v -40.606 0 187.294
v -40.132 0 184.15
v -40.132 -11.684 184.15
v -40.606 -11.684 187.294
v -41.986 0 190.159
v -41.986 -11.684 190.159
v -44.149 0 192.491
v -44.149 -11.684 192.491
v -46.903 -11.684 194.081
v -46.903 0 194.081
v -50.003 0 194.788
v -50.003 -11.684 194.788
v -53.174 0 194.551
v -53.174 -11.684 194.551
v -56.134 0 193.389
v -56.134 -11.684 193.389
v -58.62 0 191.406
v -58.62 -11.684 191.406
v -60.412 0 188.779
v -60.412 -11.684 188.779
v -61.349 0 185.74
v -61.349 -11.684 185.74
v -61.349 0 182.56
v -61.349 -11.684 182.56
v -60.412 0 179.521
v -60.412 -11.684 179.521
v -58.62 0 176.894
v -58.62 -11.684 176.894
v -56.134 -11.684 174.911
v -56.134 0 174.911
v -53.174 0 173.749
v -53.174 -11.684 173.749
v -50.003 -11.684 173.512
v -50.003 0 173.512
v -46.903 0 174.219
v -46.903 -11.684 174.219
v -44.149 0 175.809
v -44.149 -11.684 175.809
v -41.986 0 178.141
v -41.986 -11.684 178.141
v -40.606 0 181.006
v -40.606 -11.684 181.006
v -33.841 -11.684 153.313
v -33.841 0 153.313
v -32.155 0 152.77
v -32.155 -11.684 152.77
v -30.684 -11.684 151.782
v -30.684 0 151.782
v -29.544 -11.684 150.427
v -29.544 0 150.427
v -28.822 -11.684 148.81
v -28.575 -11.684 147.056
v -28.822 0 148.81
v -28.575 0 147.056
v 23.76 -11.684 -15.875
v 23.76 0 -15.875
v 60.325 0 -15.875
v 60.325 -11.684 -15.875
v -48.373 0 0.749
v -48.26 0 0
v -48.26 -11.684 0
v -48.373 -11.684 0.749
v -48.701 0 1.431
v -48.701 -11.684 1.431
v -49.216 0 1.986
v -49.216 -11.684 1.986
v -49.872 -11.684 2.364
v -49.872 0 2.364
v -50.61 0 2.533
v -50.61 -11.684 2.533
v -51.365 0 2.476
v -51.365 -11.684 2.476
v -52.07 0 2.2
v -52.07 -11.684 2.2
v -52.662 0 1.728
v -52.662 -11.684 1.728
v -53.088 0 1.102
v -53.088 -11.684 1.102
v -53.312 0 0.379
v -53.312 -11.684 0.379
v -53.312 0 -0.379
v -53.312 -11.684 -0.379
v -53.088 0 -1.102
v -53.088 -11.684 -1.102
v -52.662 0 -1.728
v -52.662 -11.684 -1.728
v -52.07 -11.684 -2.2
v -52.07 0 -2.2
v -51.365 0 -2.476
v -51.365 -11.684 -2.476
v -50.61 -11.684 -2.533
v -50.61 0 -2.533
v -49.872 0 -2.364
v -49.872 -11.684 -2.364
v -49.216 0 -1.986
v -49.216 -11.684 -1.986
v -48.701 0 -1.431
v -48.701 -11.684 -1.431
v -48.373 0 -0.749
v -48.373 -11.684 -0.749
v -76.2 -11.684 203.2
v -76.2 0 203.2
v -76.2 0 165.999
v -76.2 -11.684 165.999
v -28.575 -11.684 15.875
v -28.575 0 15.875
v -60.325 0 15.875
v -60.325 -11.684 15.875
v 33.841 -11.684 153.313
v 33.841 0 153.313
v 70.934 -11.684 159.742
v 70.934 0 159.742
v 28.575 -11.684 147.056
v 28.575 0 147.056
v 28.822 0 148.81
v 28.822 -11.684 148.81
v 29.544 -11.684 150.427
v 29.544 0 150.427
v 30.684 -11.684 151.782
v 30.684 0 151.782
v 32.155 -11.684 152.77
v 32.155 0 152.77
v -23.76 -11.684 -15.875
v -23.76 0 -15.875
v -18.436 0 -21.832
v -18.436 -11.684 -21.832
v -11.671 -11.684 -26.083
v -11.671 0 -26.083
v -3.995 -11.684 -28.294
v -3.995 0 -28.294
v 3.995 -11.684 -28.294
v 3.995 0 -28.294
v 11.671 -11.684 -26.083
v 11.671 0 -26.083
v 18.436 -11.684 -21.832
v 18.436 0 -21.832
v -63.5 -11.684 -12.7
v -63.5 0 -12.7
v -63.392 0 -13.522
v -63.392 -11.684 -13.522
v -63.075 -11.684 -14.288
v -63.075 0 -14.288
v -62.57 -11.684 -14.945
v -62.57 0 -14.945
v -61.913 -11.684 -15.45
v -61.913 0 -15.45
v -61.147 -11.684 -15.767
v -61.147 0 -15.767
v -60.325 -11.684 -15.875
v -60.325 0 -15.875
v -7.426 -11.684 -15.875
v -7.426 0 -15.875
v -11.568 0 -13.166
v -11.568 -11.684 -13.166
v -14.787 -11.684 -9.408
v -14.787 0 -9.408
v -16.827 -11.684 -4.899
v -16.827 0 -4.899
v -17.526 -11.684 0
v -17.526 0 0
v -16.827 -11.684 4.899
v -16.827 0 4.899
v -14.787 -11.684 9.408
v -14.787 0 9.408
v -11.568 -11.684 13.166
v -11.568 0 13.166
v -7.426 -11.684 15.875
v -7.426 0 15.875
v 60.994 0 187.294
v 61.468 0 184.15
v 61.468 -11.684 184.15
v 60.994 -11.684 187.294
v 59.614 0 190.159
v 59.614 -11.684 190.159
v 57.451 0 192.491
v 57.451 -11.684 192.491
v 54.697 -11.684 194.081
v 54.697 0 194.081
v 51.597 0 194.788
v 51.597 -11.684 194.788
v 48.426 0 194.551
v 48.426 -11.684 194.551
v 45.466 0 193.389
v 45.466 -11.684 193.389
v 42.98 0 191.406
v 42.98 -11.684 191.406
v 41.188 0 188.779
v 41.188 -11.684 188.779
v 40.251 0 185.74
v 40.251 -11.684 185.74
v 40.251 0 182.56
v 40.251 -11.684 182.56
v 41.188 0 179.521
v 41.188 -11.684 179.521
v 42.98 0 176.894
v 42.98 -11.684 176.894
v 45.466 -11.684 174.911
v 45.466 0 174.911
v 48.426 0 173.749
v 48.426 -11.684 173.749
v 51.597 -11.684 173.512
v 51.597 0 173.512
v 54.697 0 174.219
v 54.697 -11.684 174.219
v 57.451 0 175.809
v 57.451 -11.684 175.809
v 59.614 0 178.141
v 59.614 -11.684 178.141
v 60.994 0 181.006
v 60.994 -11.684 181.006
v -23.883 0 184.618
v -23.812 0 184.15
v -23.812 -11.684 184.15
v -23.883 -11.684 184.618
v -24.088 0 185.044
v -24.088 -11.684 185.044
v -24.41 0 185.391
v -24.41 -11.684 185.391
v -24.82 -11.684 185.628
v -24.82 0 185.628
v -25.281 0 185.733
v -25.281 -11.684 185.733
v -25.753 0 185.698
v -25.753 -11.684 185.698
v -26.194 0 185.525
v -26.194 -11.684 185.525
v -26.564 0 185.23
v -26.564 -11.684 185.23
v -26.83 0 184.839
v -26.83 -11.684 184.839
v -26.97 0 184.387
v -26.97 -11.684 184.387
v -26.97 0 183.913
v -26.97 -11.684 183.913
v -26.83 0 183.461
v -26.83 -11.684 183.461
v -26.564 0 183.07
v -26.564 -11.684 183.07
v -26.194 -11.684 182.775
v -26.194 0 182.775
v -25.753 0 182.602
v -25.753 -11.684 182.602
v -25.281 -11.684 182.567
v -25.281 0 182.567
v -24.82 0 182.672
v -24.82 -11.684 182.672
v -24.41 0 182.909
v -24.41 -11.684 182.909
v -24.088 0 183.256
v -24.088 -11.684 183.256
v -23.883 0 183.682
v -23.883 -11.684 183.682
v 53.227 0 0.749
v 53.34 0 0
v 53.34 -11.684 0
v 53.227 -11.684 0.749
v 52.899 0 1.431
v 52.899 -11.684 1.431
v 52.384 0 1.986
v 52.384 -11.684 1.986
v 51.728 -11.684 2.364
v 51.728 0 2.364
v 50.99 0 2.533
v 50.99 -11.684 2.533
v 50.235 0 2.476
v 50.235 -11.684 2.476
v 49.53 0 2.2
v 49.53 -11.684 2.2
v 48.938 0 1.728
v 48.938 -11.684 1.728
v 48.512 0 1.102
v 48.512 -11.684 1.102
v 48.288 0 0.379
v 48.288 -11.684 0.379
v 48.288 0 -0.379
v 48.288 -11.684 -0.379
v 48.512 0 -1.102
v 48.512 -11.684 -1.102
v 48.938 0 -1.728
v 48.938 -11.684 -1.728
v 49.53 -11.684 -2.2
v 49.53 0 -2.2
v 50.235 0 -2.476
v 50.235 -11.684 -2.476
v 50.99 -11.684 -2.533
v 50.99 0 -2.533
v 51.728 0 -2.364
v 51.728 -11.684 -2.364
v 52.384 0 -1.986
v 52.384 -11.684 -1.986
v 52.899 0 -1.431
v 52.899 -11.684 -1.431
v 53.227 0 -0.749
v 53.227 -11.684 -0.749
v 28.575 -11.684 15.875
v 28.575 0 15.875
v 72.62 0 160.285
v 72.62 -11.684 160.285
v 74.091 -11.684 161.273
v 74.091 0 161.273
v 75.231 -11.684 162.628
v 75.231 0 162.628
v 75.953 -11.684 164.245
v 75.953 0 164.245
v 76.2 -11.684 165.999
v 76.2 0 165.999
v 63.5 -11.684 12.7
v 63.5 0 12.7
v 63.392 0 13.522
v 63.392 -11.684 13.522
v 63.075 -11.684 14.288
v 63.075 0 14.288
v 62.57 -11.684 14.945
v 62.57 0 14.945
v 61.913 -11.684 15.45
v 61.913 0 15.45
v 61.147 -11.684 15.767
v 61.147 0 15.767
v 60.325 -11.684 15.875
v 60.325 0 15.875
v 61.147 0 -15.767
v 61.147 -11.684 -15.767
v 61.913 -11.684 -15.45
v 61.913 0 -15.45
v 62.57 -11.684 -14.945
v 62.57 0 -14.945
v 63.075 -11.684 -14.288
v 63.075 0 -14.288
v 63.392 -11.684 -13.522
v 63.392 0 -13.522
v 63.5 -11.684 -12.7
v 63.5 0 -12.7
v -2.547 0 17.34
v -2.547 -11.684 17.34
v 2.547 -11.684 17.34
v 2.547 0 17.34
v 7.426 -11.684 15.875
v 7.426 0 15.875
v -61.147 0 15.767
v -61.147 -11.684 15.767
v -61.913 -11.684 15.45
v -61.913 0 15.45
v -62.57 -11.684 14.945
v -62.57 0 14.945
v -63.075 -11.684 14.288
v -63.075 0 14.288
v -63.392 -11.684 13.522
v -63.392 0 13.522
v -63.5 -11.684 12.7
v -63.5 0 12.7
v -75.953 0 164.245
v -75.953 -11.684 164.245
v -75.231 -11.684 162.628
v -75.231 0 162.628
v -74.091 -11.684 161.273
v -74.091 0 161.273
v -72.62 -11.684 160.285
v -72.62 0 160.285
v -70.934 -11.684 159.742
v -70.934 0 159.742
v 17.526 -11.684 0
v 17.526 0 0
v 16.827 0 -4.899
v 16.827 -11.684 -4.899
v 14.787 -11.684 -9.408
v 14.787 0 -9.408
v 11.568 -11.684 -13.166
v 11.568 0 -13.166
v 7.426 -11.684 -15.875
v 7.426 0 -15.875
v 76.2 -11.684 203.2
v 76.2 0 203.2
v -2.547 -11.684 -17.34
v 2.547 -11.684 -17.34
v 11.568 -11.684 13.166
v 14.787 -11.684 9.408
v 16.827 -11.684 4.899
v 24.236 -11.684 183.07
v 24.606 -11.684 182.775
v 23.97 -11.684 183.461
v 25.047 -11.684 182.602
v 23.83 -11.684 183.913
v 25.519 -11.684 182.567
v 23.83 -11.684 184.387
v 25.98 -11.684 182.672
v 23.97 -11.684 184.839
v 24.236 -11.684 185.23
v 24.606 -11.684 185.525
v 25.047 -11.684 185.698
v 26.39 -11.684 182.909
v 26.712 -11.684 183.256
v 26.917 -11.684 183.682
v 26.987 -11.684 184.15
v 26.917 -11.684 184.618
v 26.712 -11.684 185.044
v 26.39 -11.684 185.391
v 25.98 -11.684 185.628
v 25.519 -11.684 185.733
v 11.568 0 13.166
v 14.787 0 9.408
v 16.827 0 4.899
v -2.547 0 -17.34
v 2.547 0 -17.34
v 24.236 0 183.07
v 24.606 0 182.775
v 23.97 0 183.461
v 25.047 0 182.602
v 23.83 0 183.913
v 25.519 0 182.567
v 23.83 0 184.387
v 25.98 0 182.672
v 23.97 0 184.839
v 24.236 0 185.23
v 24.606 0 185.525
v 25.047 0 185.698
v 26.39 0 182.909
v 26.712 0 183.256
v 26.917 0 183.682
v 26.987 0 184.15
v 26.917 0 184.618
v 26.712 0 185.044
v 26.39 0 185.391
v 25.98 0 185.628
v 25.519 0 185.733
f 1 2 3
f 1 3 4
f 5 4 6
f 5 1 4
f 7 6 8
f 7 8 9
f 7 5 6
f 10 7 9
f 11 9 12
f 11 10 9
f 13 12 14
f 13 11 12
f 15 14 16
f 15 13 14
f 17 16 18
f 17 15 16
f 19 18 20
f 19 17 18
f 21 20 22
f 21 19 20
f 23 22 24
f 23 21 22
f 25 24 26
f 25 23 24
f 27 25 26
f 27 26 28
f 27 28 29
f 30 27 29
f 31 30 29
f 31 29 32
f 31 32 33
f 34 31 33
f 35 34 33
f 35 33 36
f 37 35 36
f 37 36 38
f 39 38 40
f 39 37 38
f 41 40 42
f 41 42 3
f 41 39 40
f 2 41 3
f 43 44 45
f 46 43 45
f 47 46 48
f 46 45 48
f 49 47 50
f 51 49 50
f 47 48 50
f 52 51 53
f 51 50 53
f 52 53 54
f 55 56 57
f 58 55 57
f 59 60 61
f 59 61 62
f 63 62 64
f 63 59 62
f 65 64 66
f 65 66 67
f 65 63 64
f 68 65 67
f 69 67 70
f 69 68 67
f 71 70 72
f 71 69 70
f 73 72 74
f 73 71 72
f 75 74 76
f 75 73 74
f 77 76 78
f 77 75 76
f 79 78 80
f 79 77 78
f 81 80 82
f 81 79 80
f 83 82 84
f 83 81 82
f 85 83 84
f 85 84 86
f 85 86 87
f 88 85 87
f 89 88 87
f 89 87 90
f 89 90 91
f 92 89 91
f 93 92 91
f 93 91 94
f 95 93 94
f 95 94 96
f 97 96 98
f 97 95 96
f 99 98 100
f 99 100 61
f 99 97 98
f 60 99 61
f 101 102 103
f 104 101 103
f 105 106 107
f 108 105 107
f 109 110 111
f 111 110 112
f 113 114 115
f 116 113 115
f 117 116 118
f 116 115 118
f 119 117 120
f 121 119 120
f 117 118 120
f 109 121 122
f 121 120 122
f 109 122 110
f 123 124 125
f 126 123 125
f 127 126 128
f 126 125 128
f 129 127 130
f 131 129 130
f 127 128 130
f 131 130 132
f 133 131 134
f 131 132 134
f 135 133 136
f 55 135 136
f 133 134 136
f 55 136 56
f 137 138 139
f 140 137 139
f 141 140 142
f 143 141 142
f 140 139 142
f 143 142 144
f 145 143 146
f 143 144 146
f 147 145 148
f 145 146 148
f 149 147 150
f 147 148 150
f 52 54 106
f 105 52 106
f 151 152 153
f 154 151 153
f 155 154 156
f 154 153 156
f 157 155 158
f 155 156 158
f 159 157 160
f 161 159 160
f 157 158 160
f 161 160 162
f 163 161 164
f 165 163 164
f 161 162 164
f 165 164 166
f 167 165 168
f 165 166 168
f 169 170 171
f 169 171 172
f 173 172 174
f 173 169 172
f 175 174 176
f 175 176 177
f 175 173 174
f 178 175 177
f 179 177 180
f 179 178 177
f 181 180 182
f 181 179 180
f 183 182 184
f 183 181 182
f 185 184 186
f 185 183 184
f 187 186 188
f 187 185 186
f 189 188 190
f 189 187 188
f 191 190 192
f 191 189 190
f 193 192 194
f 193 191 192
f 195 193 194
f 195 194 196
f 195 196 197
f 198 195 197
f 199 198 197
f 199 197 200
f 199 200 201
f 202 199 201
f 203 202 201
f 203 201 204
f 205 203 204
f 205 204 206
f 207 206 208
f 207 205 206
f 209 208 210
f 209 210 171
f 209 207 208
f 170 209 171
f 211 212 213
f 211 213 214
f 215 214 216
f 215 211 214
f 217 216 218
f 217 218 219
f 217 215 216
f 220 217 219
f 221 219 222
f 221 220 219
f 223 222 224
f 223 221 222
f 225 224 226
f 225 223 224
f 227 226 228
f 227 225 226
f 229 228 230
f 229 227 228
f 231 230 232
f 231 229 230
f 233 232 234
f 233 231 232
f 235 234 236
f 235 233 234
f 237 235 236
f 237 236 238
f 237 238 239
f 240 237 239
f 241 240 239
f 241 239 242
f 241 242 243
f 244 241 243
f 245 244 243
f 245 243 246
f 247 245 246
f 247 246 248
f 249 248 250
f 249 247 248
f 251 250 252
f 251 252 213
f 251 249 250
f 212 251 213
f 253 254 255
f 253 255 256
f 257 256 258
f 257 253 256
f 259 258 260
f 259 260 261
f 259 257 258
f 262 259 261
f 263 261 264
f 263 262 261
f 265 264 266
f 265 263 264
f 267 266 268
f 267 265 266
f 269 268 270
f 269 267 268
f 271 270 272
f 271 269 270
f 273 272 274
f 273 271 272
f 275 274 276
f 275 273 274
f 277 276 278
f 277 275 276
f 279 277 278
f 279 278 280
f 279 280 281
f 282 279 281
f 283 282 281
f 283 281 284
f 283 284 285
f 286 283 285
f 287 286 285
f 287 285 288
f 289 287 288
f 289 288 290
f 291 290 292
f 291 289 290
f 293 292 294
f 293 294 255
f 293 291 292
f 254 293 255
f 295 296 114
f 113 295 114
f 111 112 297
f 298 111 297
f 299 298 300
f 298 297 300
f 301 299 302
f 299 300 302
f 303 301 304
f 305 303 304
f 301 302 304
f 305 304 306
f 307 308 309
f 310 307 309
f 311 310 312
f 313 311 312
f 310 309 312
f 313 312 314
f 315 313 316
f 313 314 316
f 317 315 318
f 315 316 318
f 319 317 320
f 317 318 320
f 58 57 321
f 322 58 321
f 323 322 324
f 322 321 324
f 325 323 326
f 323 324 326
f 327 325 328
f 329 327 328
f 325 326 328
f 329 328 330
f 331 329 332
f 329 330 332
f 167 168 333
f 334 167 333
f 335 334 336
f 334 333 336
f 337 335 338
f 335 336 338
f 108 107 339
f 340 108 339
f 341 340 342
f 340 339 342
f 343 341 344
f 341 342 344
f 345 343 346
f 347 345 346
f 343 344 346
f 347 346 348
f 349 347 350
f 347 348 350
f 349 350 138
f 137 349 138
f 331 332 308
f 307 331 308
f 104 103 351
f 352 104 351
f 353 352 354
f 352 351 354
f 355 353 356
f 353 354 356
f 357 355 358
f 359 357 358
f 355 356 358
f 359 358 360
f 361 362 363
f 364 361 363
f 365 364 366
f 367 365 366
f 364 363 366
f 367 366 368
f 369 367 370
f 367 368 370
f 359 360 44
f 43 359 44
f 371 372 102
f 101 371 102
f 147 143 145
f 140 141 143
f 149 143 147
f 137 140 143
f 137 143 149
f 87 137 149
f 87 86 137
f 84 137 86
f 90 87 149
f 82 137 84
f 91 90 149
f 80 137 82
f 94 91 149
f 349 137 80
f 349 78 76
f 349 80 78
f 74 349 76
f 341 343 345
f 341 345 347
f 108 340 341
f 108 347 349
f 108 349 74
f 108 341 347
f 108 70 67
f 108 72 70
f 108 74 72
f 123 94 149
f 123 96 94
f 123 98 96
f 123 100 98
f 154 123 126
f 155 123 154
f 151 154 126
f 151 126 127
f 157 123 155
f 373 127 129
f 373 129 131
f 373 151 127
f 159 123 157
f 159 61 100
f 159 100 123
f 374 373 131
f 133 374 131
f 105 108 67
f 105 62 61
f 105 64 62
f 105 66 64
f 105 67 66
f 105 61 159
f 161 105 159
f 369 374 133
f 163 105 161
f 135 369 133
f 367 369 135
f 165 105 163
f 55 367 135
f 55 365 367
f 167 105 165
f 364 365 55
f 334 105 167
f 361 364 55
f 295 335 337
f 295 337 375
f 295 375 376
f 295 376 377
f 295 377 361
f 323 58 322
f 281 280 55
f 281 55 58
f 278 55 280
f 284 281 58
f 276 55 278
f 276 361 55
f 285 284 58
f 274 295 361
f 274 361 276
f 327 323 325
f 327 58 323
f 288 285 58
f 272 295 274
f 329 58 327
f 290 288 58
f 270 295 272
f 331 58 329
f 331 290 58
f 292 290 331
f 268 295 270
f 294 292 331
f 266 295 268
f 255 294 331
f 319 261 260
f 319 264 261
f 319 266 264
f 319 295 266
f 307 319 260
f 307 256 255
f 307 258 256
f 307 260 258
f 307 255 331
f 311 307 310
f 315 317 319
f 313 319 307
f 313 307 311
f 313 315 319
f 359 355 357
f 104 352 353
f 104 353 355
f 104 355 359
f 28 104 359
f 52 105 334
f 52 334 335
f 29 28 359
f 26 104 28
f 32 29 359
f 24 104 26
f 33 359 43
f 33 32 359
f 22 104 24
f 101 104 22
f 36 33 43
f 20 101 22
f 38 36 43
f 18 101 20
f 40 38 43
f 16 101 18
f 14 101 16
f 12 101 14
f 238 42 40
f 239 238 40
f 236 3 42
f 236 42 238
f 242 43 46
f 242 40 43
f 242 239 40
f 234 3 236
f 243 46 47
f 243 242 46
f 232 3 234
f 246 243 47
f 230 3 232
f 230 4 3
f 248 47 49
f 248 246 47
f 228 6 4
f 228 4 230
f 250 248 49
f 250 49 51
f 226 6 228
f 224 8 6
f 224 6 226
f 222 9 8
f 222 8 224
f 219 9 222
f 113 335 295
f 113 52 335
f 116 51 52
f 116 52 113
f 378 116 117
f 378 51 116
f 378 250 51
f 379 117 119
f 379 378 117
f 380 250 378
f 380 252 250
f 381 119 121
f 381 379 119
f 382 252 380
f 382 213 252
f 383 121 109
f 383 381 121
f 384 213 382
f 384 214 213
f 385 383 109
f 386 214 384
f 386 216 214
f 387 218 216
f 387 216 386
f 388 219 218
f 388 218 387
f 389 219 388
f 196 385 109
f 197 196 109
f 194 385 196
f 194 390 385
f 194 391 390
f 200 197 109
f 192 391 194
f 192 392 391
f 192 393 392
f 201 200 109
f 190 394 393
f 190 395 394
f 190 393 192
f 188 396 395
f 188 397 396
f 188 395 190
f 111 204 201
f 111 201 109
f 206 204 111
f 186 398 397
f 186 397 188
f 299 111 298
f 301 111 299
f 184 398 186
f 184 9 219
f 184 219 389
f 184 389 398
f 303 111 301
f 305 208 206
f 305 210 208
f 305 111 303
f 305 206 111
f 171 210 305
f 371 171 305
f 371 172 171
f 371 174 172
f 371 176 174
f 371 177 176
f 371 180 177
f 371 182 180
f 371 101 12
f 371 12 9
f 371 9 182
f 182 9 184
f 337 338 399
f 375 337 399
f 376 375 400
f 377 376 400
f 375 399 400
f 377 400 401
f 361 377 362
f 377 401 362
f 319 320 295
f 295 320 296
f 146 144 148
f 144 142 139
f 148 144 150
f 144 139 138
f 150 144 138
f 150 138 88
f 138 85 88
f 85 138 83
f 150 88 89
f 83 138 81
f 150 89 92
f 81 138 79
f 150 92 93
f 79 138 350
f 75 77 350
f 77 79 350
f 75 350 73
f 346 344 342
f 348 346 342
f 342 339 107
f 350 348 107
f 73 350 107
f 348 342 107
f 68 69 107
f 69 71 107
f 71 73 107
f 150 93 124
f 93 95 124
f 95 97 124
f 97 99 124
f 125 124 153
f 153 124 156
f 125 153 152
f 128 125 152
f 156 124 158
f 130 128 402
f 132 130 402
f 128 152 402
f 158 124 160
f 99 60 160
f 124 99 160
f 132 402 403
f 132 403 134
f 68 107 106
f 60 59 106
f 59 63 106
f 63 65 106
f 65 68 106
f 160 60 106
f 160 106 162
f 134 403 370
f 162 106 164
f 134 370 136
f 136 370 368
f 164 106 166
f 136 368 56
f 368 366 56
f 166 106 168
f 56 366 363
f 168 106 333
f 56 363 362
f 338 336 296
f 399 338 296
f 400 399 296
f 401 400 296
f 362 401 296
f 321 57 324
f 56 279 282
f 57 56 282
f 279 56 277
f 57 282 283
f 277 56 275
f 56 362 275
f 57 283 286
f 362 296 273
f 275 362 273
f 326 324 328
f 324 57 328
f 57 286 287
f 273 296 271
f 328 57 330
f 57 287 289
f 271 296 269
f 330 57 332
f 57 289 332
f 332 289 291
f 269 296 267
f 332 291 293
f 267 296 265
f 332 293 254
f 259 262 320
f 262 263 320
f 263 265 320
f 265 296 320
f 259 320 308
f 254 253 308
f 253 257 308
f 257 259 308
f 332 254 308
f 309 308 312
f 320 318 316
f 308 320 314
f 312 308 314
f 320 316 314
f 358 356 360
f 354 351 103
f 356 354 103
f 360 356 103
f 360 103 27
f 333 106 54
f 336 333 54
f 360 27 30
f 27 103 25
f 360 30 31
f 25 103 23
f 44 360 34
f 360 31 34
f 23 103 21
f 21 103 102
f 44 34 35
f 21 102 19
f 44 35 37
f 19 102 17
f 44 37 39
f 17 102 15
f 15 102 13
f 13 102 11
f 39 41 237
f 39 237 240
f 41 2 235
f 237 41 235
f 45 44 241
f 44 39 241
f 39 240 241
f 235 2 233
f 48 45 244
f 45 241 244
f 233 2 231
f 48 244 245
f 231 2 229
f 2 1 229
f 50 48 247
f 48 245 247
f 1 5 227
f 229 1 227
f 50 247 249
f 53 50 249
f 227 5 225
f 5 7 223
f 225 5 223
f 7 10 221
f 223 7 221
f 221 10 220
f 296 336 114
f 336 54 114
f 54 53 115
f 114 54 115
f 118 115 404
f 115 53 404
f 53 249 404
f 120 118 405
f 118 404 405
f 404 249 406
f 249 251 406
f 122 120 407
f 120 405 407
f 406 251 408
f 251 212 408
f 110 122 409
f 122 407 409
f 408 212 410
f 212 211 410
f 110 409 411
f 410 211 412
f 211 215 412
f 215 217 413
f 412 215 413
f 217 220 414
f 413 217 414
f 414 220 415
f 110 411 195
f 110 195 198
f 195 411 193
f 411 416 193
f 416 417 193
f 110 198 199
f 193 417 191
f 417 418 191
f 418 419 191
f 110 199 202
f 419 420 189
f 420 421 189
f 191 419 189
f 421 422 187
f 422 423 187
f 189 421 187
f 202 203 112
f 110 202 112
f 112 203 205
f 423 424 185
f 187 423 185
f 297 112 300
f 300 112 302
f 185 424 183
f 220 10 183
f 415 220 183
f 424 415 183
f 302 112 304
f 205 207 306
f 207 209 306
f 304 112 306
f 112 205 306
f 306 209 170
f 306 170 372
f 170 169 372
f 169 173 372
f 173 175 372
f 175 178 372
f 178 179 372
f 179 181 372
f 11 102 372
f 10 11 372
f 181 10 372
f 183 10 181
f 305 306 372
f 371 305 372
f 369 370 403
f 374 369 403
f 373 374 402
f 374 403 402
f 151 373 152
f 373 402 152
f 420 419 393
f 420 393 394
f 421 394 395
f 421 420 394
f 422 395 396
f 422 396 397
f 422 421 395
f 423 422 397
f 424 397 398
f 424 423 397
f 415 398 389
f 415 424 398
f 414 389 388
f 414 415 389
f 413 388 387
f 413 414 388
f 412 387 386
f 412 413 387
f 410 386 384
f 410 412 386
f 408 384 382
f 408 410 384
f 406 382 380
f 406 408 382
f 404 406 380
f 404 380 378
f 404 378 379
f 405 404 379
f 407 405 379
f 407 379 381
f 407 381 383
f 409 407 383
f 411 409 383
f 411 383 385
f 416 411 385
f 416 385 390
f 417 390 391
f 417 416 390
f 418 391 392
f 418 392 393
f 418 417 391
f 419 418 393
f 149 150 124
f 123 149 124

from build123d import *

# Parameters (mm, degrees)
F0_R     = 10.668
F0_R_2   = 1.5875
F0_R_3   = 2.54
F1_DEPTH = 11.684


with BuildPart() as f1:
    # F0 (on Front) → F1 (new body)
    with BuildSketch(Plane.XZ):
        with BuildLine():
            ThreePointArc((-23.759524406, 15.875), (0, 28.575), (23.759524406, 15.875))
            Line((23.759524406, 15.875), (28.575, 15.875))
            Line((28.575, 15.875), (28.575, 147.0559814834))
            ThreePointArc((28.575, 147.0559814834), (30.0665512939, 151.1447436641), (33.8405043055, 153.312687413))
            Line((33.8405043055, 153.312687413), (70.9344956945, 159.742312587))
            ThreePointArc((70.9344956945, 159.742312587), (74.7084487061, 161.9102563359), (76.2, 165.9990185166))
            Line((76.2, 165.9990185166), (76.2, 203.2))
            Line((76.2, 203.2), (17.526, 203.2))
            Line((17.526, 203.2), (-17.526, 203.2))
            Line((-17.526, 203.2), (-76.2, 203.2))
            Line((-76.2, 203.2), (-76.2, 165.9990185166))
            ThreePointArc((-76.2, 165.9990185166), (-74.7084487061, 161.9102563359), (-70.9344956945, 159.742312587))
            Line((-70.9344956945, 159.742312587), (-33.8405043055, 153.312687413))
            ThreePointArc((-33.8405043055, 153.312687413), (-30.0665512939, 151.1447436641), (-28.575, 147.0559814834))
            Line((-28.575, 147.0559814834), (-28.575, 15.875))
            Line((-28.575, 15.875), (-23.759524406, 15.875))
        make_face()
        with Locations((-50.8, 184.15)):
            Circle(F0_R, mode=Mode.SUBTRACT)
        with Locations((-25.4, 184.15)):
            Circle(F0_R_2, mode=Mode.SUBTRACT)
        with Locations((25.4, 184.15)):
            Circle(F0_R_2, mode=Mode.SUBTRACT)
        with Locations((50.8, 184.15)):
            Circle(F0_R, mode=Mode.SUBTRACT)
        with BuildLine():
            Line((-60.325, -15.875), (-23.759524406, -15.875))
            ThreePointArc((-23.759524406, -15.875), (-27.3446433045, -8.2946433045), (-28.575, 0))
            Line((-28.575, 0), (-28.575, 15.875))
            Line((-28.575, 15.875), (-60.325, 15.875))
            ThreePointArc((-60.325, 15.875), (-62.5700640303, 14.9450640303), (-63.5, 12.7))
            Line((-63.5, 12.7), (-63.5, -12.7))
            ThreePointArc((-63.5, -12.7), (-62.5700640303, -14.9450640303), (-60.325, -15.875))
        make_face()
        with Locations((-50.8, 0)):
            Circle(F0_R_3, mode=Mode.SUBTRACT)
        with BuildLine():
            ThreePointArc((28.575, 0), (27.3446433045, -8.2946433045), (23.759524406, -15.875))
            Line((23.759524406, -15.875), (60.325, -15.875))
            ThreePointArc((60.325, -15.875), (62.5700640303, -14.9450640303), (63.5, -12.7))
            Line((63.5, -12.7), (63.5, 12.7))
            ThreePointArc((63.5, 12.7), (62.5700640303, 14.9450640303), (60.325, 15.875))
            Line((60.325, 15.875), (28.575, 15.875))
            Line((28.575, 15.875), (28.575, 0))
        make_face()
        with Locations((50.8, 0)):
            Circle(F0_R_3, mode=Mode.SUBTRACT)
        with BuildLine():
            Line((23.759524406, -15.875), (7.4259713843, -15.875))
            ThreePointArc((7.4259713843, -15.875), (0, -17.526), (-7.4259713843, -15.875))
            Line((-7.4259713843, -15.875), (-23.759524406, -15.875))
            ThreePointArc((-23.759524406, -15.875), (0, -28.575), (23.759524406, -15.875))
        make_face()
        with BuildLine():
            ThreePointArc((-7.4259713843, -15.875), (-17.526, 0), (-7.4259713843, 15.875))
            Line((-7.4259713843, 15.875), (-23.759524406, 15.875))
            ThreePointArc((-23.759524406, 15.875), (-27.3446433045, 8.2946433045), (-28.575, 0))
            ThreePointArc((-28.575, 0), (-27.3446433045, -8.2946433045), (-23.759524406, -15.875))
            Line((-23.759524406, -15.875), (-7.4259713843, -15.875))
        make_face()
        with BuildLine():
            ThreePointArc((-7.4259713843, 15.875), (0, 17.526), (7.4259713843, 15.875))
            Line((7.4259713843, 15.875), (23.759524406, 15.875))
            ThreePointArc((23.759524406, 15.875), (0, 28.575), (-23.759524406, 15.875))
            Line((-23.759524406, 15.875), (-7.4259713843, 15.875))
        make_face()
        with BuildLine():
            ThreePointArc((7.4259713843, 15.875), (14.7869579441, 9.4077920236), (17.526, 0))
            ThreePointArc((17.526, 0), (14.7869579441, -9.4077920236), (7.4259713843, -15.875))
            Line((7.4259713843, -15.875), (23.759524406, -15.875))
            ThreePointArc((23.759524406, -15.875), (27.3446433045, -8.2946433045), (28.575, 0))
            ThreePointArc((28.575, 0), (27.3446433045, 8.2946433045), (23.759524406, 15.875))
            Line((23.759524406, 15.875), (7.4259713843, 15.875))
        make_face()
        with BuildLine():
            ThreePointArc((-28.575, 0), (-27.3446433045, 8.2946433045), (-23.759524406, 15.875))
            Line((-23.759524406, 15.875), (-28.575, 15.875))
            Line((-28.575, 15.875), (-28.575, 0))
        make_face()
        with BuildLine():
            Line((28.575, 15.875), (23.759524406, 15.875))
            ThreePointArc((23.759524406, 15.875), (27.3446433045, 8.2946433045), (28.575, 0))
            Line((28.575, 0), (28.575, 15.875))
        make_face()
    extrude(amount=F1_DEPTH)


solid = f1.part
